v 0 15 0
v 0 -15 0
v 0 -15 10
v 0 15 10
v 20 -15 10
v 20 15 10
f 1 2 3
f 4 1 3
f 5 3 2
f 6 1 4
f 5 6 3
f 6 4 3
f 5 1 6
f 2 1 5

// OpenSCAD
X=20;
Y=30;
Z=10;
echo(version());
cube_size = 20; // [10:Small,20:Medium,30:Large]

hole_diameter = 2.5;
hole_radius = hole_diameter/2;

// How deep should the center hole be?
hole_depth = 1; // [0,1,5,50]

show_wheels = "yes"; // [yes,no]

// How thick should the side wheels be?
wheel_thickness = 1; // [1:20]

// ignore this variable!
// foo=1;

// don't turn functions into params!
function BEZ03(u) = pow((1-u), 3);

// ignore variable values
bing = 3+4;
baz = 3 / hole_depth;

module triangle(scale) {polyhedron(points = [[0, -10, 60], [0, 10, 60], [0, 10, 0], [0, -10, 0], [60, -10, 60], [60, 10, 60]], 
triangles = [[0,3,2], [0,2,1], [3,0,4], [1,2,5], [0,5,4], [0,1,5],  [5,2,4], [4,2,3], ]);}

//resize(newsize=[X,Y,Z]) triangle(1);
resize([X,Y,Z]) triangle(1);

